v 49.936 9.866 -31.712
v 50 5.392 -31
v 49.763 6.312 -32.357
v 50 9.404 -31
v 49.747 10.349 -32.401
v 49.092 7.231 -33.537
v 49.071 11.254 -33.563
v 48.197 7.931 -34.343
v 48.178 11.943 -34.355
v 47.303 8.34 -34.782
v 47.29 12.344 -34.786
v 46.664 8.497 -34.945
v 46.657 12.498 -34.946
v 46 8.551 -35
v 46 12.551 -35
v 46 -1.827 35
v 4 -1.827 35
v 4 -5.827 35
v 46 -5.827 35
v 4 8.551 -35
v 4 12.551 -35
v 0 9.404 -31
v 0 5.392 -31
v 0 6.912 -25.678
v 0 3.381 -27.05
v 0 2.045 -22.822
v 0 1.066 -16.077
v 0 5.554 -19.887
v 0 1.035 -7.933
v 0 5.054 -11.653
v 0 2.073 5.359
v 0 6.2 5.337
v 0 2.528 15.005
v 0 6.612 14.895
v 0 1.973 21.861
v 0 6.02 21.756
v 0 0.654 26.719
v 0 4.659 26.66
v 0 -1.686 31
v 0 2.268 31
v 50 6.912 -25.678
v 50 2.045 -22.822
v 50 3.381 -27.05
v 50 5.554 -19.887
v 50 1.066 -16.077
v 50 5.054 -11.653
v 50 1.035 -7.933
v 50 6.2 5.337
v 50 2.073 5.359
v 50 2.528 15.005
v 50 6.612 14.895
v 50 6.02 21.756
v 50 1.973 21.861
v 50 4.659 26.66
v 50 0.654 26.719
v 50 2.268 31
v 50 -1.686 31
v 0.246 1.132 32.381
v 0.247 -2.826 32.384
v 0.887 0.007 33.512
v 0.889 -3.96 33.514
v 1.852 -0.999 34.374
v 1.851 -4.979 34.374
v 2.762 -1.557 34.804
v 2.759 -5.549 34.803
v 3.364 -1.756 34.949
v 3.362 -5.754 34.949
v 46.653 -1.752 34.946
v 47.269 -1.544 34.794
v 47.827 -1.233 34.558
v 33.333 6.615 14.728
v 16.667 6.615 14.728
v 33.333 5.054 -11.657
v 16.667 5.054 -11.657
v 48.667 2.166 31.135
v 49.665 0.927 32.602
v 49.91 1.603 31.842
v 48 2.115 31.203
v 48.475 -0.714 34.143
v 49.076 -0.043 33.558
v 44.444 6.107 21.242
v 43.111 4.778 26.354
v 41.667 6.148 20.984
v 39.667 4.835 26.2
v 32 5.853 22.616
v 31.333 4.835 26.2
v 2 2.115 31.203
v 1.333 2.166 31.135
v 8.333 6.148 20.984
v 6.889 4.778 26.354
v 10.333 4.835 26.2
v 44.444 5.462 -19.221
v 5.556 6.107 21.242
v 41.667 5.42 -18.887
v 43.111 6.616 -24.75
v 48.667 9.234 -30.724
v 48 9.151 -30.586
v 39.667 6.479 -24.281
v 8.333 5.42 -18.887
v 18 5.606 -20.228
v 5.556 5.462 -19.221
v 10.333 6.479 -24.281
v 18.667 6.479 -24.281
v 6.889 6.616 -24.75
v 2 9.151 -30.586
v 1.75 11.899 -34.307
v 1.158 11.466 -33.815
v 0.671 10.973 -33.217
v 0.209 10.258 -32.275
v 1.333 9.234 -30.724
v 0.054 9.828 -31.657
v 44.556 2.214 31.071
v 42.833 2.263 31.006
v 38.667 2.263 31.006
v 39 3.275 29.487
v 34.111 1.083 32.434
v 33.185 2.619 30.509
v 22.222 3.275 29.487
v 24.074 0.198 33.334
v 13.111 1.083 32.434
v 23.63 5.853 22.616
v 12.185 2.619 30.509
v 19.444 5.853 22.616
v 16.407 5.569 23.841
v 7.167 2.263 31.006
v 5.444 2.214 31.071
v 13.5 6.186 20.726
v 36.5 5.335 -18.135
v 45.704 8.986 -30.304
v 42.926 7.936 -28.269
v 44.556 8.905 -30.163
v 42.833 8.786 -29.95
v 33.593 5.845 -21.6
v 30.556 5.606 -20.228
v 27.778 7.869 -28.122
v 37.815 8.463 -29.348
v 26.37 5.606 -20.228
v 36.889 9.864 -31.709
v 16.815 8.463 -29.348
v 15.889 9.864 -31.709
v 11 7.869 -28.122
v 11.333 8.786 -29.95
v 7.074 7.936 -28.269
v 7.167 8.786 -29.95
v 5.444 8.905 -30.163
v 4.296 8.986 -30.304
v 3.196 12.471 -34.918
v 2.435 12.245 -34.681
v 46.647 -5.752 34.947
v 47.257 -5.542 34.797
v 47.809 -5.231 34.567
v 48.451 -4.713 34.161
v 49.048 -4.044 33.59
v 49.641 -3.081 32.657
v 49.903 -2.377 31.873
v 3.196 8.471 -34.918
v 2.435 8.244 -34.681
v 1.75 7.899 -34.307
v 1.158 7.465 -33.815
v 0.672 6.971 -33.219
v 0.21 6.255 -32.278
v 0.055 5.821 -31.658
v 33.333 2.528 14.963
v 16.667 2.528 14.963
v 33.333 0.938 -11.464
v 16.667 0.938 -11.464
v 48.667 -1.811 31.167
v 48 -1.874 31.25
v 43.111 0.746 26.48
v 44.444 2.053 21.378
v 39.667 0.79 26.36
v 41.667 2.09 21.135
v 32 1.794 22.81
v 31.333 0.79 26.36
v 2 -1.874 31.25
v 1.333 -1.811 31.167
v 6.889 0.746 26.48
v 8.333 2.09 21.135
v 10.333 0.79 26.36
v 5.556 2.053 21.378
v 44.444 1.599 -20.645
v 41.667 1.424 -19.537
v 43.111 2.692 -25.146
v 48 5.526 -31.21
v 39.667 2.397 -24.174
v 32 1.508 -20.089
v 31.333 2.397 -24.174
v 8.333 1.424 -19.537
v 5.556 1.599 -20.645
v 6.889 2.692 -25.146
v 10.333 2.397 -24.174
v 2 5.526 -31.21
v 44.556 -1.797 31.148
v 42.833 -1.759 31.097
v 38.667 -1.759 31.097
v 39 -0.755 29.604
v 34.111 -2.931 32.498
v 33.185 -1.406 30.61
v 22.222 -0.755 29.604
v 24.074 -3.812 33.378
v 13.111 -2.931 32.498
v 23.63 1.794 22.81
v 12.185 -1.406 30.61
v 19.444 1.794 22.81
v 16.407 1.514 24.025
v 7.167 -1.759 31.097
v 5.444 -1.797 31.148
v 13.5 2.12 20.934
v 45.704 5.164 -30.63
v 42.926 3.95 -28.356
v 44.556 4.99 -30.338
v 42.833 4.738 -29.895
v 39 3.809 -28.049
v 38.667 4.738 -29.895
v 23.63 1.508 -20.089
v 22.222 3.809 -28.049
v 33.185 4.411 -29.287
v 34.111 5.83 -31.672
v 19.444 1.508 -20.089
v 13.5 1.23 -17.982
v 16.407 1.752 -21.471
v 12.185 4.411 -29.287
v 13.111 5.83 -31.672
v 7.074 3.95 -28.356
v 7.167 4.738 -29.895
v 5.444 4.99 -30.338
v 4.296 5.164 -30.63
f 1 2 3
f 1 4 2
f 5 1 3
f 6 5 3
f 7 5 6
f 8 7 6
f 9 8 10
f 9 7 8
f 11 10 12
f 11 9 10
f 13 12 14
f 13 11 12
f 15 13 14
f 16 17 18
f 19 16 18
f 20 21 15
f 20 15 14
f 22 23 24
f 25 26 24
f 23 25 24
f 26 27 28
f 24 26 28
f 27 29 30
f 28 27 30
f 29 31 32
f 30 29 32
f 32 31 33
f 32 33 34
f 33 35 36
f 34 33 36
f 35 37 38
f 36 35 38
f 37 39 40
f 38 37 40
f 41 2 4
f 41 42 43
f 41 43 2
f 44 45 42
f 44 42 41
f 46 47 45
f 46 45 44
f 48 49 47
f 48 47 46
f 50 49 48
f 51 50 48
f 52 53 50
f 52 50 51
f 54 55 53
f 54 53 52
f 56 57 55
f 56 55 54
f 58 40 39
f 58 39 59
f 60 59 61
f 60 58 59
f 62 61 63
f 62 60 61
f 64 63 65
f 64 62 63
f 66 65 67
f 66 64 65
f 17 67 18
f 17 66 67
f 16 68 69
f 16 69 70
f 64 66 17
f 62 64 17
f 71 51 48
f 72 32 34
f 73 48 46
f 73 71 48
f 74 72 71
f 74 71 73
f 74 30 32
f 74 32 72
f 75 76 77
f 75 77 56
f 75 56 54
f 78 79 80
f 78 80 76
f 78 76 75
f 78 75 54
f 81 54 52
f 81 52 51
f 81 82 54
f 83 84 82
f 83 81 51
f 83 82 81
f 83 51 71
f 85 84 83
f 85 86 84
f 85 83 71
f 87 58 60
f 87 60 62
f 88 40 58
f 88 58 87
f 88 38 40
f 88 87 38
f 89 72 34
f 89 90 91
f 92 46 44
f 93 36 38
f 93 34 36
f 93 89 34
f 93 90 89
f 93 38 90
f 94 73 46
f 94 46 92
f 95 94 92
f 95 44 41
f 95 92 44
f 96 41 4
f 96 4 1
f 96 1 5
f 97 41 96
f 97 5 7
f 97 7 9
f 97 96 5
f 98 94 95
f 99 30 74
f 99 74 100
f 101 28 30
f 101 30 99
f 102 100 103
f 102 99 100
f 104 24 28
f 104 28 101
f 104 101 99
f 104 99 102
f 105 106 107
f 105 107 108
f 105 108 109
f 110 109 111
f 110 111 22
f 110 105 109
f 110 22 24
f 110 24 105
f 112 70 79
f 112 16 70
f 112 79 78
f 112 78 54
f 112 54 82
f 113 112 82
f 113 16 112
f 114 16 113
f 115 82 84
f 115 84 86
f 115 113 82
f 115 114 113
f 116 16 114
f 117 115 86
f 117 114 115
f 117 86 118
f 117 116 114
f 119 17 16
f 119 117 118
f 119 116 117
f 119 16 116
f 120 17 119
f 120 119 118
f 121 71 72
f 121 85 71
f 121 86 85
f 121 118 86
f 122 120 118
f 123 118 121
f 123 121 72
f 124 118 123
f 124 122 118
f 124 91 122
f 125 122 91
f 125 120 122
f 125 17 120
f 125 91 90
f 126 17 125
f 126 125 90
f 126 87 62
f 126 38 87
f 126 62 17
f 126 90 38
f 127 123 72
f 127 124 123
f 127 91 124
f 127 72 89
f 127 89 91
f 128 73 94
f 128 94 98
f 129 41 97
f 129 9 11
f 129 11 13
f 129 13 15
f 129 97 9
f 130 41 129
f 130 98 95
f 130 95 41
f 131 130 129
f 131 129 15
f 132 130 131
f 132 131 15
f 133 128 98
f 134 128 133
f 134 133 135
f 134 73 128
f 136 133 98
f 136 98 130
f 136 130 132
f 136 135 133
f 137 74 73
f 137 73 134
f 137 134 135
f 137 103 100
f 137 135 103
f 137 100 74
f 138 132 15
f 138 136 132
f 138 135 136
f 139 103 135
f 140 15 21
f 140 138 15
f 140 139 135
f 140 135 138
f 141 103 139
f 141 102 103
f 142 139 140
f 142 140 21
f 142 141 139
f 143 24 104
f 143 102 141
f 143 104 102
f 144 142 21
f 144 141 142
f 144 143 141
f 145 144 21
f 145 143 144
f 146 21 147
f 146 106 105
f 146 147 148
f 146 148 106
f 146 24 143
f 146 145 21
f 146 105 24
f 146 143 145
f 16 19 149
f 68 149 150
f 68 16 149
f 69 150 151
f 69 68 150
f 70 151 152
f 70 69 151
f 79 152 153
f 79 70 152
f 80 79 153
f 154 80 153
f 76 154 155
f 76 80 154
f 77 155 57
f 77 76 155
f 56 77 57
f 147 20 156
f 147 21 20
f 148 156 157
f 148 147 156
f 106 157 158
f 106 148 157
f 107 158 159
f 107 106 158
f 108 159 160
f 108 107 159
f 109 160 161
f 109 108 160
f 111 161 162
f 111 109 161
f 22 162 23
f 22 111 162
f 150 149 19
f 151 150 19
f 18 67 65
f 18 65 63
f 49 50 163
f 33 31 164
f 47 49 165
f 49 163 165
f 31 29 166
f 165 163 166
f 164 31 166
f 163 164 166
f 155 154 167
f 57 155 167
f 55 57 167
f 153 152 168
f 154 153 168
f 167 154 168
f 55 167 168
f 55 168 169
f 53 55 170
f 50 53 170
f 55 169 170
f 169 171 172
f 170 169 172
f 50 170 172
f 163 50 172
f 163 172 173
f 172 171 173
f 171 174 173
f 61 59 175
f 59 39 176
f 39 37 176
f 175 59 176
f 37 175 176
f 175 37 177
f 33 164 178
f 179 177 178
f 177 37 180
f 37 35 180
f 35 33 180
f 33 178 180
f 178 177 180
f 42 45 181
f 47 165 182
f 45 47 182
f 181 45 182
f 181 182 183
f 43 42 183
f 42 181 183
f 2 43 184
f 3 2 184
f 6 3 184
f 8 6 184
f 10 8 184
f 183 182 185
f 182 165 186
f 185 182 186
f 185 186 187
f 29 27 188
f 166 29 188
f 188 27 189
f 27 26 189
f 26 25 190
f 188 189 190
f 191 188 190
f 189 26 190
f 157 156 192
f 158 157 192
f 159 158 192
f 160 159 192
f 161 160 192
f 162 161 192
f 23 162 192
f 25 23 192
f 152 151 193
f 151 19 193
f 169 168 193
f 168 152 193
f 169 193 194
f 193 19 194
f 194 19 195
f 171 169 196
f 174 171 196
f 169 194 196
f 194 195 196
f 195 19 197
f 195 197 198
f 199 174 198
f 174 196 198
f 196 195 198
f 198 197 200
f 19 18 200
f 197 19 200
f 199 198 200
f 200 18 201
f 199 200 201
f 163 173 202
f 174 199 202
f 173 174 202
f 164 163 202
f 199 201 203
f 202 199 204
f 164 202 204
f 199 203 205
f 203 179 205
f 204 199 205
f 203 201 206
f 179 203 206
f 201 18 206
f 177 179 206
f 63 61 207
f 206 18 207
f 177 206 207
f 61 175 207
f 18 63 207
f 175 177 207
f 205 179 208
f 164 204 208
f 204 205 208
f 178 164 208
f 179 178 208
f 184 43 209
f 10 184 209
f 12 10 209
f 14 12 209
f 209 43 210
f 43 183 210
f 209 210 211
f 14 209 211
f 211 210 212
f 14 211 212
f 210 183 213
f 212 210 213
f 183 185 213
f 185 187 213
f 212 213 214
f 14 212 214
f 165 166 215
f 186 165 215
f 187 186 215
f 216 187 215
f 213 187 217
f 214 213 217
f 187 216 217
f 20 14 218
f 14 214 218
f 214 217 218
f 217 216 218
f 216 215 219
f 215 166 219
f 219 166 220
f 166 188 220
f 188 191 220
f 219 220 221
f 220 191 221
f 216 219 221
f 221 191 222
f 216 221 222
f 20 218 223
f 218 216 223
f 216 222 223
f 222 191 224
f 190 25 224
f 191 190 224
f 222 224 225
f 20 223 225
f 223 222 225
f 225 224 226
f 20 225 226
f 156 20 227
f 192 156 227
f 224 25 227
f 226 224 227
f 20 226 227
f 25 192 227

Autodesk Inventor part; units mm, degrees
ref_plane "YZ Plane" through (0, 0, 0) normal (1, 0, 0) x (0, 1, 0)
ref_plane "XZ Plane" through (0, 0, 0) normal (0, 1, 0) x (-1, 0, 0)
ref_plane "XY Plane" through (0, 0, 0) normal (0, 0, 1) x (1, 0, 0)
sketch "Sketch2" plane through (0, 0, 0) normal (1, 0, 0) x (0, 1, 0)
  line L0 (-1.8268, 35) -> (17.968, 20.835) construction
  line L1 (17.968, 20.835) -> (-5.8268, -16.2285) construction
  line L2 (-5.8268, -16.2285) -> (12.551, -35) construction
  spline S0 degree 3 poles (-1.8268, 35) (17.968, 20.835) (-5.8268, -16.2285) (12.551, -35) knots 1 1 1 1 2 2 2 2
  line L3 (43.3052, 0) -> (-43.3052, 0) construction
  line L4 (0, 65.4619) -> (0, -65.4619) construction
  line L5 (12.551, -35) -> (8.551, -35)
  line L6 (-5.8268, 35) -> (13.8832, 21.2522) construction
  line L7 (13.8832, 21.2522) -> (-10.0462, -16.0043) construction
  line L8 (-10.0462, -16.0043) -> (8.551, -35) construction
  spline S1 degree 3 poles (-5.8268, 35) (13.8832, 21.2522) (-10.0462, -16.0043) (8.551, -35) knots 1 1 1 1 2 2 2 2
  line L9 (-1.8268, 35) -> (-5.8268, 35)
  point P0 (0, 0)
  point P1 (0, 0)
  point P2 (0, 0)
  dimension "d0" = 70
  dimension "d1" = 35
  dimension "d3" = 4
  dimension "d4" = 4
extrude "Extrusion1" add sketch "Sketch2" along normal blind 50
fillet "Fillet1" radius 4 4 edges at (50, -3.8268, 35) (0, -3.8268, 35) (50, 10.551, -35) (0, 10.551, -35)
equation "\"d4\" = d3"
properties part number "Case Top"
